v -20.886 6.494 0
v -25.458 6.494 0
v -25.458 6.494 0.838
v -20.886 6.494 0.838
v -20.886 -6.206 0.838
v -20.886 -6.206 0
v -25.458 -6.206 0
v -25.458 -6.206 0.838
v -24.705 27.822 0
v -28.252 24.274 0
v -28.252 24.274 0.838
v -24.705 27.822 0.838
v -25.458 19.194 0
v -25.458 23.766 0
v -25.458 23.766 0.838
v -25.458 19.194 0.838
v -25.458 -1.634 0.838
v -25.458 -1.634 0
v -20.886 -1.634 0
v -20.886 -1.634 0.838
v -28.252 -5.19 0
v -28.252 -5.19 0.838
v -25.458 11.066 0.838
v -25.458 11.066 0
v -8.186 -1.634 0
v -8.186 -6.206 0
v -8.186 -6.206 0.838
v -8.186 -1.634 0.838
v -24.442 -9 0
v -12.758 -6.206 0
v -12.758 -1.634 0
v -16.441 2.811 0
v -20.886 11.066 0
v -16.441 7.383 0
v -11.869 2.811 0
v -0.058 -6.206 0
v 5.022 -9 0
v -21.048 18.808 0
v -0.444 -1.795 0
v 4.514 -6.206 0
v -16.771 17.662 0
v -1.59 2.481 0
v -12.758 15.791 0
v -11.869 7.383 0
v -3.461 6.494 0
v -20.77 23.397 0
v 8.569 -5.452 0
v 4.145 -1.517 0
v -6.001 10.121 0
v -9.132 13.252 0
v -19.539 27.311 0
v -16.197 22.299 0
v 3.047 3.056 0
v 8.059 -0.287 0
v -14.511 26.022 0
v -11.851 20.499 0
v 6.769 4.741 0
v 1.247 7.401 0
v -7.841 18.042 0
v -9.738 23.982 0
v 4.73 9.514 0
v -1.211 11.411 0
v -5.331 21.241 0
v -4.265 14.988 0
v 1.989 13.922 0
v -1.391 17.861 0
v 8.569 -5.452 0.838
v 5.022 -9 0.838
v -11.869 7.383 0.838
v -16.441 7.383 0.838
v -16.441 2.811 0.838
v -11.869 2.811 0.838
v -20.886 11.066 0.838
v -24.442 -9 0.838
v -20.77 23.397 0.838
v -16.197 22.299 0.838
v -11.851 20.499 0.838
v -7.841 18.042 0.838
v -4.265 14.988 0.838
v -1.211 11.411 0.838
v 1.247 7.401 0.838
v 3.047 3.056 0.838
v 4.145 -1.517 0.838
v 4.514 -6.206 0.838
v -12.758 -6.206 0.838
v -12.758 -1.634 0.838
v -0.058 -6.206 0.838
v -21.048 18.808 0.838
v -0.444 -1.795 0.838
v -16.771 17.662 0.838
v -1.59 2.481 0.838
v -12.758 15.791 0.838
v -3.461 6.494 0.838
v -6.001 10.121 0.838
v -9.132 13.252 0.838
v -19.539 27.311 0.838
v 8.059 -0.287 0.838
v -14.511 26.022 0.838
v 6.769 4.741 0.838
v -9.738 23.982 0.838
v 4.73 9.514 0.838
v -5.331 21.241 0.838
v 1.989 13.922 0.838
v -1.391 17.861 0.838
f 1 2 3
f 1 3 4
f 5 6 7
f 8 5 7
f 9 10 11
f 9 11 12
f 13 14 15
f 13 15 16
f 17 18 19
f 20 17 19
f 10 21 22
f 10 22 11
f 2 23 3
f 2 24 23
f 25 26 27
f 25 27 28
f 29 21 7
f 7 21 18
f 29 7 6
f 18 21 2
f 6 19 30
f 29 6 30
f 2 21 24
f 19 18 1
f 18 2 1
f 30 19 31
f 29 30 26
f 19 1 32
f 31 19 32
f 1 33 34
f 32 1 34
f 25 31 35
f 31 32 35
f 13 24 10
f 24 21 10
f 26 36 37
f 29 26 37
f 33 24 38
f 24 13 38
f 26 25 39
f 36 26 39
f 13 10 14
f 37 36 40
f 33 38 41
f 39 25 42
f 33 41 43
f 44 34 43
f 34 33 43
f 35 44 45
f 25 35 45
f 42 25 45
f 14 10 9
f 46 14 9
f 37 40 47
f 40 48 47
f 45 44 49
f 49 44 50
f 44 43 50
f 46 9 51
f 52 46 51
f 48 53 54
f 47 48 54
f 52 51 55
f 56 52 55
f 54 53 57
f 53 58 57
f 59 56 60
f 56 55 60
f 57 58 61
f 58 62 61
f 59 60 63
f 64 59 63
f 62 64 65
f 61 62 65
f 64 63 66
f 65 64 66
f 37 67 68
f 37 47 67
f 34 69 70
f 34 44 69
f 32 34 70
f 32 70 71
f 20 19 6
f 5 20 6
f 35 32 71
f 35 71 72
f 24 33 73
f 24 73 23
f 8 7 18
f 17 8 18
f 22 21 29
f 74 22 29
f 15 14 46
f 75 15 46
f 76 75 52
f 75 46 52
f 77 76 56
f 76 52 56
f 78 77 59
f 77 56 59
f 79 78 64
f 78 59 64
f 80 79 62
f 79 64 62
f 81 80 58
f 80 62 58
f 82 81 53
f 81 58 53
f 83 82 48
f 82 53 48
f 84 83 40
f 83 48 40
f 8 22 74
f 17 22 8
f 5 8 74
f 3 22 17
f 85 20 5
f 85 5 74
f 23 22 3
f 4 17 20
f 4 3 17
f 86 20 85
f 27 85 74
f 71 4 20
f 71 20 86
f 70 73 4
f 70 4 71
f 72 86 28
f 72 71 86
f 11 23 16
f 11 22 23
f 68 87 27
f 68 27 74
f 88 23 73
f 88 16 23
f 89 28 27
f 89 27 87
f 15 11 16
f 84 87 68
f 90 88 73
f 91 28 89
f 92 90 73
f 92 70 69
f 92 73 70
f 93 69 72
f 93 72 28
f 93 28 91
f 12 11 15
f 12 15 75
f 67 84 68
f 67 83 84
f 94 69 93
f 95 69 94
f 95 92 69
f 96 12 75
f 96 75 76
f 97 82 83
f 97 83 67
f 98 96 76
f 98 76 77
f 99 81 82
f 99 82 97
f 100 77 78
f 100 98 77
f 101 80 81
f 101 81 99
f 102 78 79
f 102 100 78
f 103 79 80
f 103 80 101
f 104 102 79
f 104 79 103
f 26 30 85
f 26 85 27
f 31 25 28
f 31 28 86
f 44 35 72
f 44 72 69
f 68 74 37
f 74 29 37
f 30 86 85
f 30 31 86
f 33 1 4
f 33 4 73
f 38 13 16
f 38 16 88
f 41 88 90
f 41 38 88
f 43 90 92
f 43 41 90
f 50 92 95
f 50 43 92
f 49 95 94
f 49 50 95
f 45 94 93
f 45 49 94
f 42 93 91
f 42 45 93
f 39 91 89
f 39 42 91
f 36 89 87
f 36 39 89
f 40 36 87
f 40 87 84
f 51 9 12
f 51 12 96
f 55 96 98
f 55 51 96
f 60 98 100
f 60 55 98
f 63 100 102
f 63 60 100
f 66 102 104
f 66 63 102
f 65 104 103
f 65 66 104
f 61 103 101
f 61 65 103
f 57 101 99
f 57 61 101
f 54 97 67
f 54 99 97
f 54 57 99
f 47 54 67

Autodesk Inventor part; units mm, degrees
ref_plane "YZ Plane" through (0, 0, 0) normal (1, 0, 0) x (0, 1, 0)
ref_plane "XZ Plane" through (0, 0, 0) normal (0, 1, 0) x (-1, 0, 0)
ref_plane "XY Plane" through (0, 0, 0) normal (0, 0, 1) x (1, 0, 0)
sketch "Sketch1" plane through (0, 0, 0) normal (0, 0, 1) x (1, 0, 0)
  line L0 (-25.4584, -1.6339) -> (-20.8864, -1.6339)
  line L1 (-20.8864, -1.6339) -> (-20.8864, -6.2059)
  line L2 (-20.8864, -6.2059) -> (-25.4584, -6.2059)
  line L3 (-25.4584, -6.2059) -> (-25.4584, -1.6339)
  line L4 (-12.7584, -6.2059) -> (-8.1864, -6.2059)
  line L5 (-8.1864, -6.2059) -> (-8.1864, -1.6339)
  line L6 (-8.1864, -1.6339) -> (-12.7584, -1.6339)
  line L7 (-12.7584, -1.6339) -> (-12.7584, -6.2059)
  line L8 (-0.0584, -6.2059) -> (4.5136, -6.2059)
  line L9 (-25.4584, 6.4941) -> (-20.8864, 6.4941)
  line L10 (-20.8864, 6.4941) -> (-20.8864, 11.0661)
  line L11 (-20.8864, 11.0661) -> (-25.4584, 11.0661)
  line L12 (-25.4584, 11.0661) -> (-25.4584, 6.4941)
  line L13 (-25.4584, 23.7661) -> (-25.4584, 19.1941)
  line L14 (-24.4424, -8.9999) -> (5.0216, -8.9999)
  line L15 (-28.2524, -5.1899) -> (-28.2524, 24.2741)
  arc A0 (-0.0584, -6.2059) -> (-25.4584, 19.1941) centre (-25.4584, -6.2059) ccw
  arc A1 (4.5136, -6.2059) -> (-25.4584, 23.7661) centre (-25.4584, -6.2059) ccw
  arc A2 (8.5693, -5.4523) -> (-24.7047, 27.8217) centre (-25.4584, -6.2059) ccw
  line L16 (-28.2524, -5.1899) -> (-24.4424, -8.9999)
  line L17 (-24.4424, -8.9999) -> (-28.2524, -5.1899)
  line L18 (-28.2524, 24.2741) -> (-24.7047, 27.8217)
  line L19 (8.5693, -5.4523) -> (5.0216, -8.9999)
  line L20 (-16.4414, 2.8111) -> (-11.8694, 2.8111)
  line L21 (-11.8694, 2.8111) -> (-11.8694, 7.3831)
  line L22 (-11.8694, 7.3831) -> (-16.4414, 7.3831)
  line L23 (-16.4414, 7.3831) -> (-16.4414, 2.8111)
  point P0 (-28.2524, -8.9999)
  point P1 (-28.2524, -8.9999)
  dimension "d0" = 4.572
  dimension "d1" = 4.572
  dimension "d2" = 4.572
  dimension "d3" = 4.572
  dimension "d4" = 4.572
  dimension "d5" = 4.572
  dimension "d6" = 8.128
  dimension "d8" = 8.128
  dimension "d10" = 4.064
  dimension "d11" = 2.794
  dimension "d12" = 2.794
  dimension "d13" = 3.81
  dimension "d14" = 3.81
  dimension "d15" = 3.81
  dimension "d16" = 3.81
  dimension "d18" = 45
  dimension "d22" = 4.572
  dimension "d23" = 4.445
  dimension "d24" = 4.445
  dimension "d25" = 4.572
extrude "Extrusion1" add sketch "Sketch1" along normal blind 0.8382
sketch "Sketch2" plane through (0, 0, 0.8382) normal (0, 0, 1) x (1, 0, 0)
  line L0 (-20.8864, -1.6339) -> (-20.8864, -6.2059) projected
  line L1 (-20.8864, -6.2059) -> (-25.4584, -6.2059) projected
  line L2 (-25.4584, -6.2059) -> (-25.4584, -1.6339) projected
  line L3 (-25.4584, -1.6339) -> (-20.8864, -1.6339) projected
  circle A0 centre (-23.1724, -3.9199) radius 2.286
  point P0 (0, 0)
surface extrude "ExtrusionSrf1" sketch "Sketch2" against normal up to surface (0.8382 mm away) shown no curves A0
pattern_linear "Rectangular Pattern1" count 2 spacing 12.7 along (1, 0, 0) of "ExtrusionSrf1"
pattern_linear "Rectangular Pattern2" count 2 spacing 12.7 along (0, 1, 0) of "ExtrusionSrf1"
sketch "Sketch3" plane through (0, 0, 0.8382) normal (0, 0, 1) x (1, 0, 0)
  line L0 (-16.4414, 2.8111) -> (-16.4414, 7.3831) projected
  line L1 (-16.4414, 7.3831) -> (-11.8694, 7.3831) projected
  line L2 (-11.8694, 7.3831) -> (-11.8694, 2.8111) projected
  line L3 (-11.8694, 2.8111) -> (-16.4414, 2.8111) projected
  circle A0 centre (-14.1554, 5.0971) radius 2.286
  point P0 (0, 0)
surface extrude "ExtrusionSrf4" sketch "Sketch3" against normal up to surface (0.8382 mm away) shown no curves A0
sketch "Sketch4" plane through (0, 0, 0.8382) normal (0, 0, 1) x (1, 0, 0)
  arc A0 (-0.0584, -6.2059) -> (-25.4584, 19.1941) centre (-25.4584, -6.2059) ccw projected
  line L0 (-25.4584, 19.1941) -> (-25.4584, 23.7661) projected
  arc A1 (4.5136, -6.2059) -> (-25.4584, 23.7661) centre (-25.4584, -6.2059) ccw projected
  circle A2 centre (-23.1724, 21.3855) radius 2.286
  point P0 (0, 0)
surface extrude "ExtrusionSrf5" sketch "Sketch4" against normal up to surface (0.8382 mm away) shown no curves A2
sketch "Sketch5" plane through (0, 0, 0.8382) normal (0, 0, 1) x (1, 0, 0)
  arc A0 (-0.0584, -6.2059) -> (-25.4584, 19.1941) centre (-25.4584, -6.2059) ccw projected
  arc A1 (4.5136, -6.2059) -> (-25.4584, 23.7661) centre (-25.4584, -6.2059) ccw projected
  line L0 (4.5136, -6.2059) -> (-0.0584, -6.2059) projected
  circle A2 centre (2.1331, -3.9199) radius 2.286
  point P0 (0, 0)
surface extrude "ExtrusionSrf6" sketch "Sketch5" against normal up to surface (0.8382 mm away) shown no curves A2
equation "\"d14\" = d13"
equation "\"d15\" = d13"
equation "\"d16\" = d15"
properties part number "275-1062" material "Steel"
